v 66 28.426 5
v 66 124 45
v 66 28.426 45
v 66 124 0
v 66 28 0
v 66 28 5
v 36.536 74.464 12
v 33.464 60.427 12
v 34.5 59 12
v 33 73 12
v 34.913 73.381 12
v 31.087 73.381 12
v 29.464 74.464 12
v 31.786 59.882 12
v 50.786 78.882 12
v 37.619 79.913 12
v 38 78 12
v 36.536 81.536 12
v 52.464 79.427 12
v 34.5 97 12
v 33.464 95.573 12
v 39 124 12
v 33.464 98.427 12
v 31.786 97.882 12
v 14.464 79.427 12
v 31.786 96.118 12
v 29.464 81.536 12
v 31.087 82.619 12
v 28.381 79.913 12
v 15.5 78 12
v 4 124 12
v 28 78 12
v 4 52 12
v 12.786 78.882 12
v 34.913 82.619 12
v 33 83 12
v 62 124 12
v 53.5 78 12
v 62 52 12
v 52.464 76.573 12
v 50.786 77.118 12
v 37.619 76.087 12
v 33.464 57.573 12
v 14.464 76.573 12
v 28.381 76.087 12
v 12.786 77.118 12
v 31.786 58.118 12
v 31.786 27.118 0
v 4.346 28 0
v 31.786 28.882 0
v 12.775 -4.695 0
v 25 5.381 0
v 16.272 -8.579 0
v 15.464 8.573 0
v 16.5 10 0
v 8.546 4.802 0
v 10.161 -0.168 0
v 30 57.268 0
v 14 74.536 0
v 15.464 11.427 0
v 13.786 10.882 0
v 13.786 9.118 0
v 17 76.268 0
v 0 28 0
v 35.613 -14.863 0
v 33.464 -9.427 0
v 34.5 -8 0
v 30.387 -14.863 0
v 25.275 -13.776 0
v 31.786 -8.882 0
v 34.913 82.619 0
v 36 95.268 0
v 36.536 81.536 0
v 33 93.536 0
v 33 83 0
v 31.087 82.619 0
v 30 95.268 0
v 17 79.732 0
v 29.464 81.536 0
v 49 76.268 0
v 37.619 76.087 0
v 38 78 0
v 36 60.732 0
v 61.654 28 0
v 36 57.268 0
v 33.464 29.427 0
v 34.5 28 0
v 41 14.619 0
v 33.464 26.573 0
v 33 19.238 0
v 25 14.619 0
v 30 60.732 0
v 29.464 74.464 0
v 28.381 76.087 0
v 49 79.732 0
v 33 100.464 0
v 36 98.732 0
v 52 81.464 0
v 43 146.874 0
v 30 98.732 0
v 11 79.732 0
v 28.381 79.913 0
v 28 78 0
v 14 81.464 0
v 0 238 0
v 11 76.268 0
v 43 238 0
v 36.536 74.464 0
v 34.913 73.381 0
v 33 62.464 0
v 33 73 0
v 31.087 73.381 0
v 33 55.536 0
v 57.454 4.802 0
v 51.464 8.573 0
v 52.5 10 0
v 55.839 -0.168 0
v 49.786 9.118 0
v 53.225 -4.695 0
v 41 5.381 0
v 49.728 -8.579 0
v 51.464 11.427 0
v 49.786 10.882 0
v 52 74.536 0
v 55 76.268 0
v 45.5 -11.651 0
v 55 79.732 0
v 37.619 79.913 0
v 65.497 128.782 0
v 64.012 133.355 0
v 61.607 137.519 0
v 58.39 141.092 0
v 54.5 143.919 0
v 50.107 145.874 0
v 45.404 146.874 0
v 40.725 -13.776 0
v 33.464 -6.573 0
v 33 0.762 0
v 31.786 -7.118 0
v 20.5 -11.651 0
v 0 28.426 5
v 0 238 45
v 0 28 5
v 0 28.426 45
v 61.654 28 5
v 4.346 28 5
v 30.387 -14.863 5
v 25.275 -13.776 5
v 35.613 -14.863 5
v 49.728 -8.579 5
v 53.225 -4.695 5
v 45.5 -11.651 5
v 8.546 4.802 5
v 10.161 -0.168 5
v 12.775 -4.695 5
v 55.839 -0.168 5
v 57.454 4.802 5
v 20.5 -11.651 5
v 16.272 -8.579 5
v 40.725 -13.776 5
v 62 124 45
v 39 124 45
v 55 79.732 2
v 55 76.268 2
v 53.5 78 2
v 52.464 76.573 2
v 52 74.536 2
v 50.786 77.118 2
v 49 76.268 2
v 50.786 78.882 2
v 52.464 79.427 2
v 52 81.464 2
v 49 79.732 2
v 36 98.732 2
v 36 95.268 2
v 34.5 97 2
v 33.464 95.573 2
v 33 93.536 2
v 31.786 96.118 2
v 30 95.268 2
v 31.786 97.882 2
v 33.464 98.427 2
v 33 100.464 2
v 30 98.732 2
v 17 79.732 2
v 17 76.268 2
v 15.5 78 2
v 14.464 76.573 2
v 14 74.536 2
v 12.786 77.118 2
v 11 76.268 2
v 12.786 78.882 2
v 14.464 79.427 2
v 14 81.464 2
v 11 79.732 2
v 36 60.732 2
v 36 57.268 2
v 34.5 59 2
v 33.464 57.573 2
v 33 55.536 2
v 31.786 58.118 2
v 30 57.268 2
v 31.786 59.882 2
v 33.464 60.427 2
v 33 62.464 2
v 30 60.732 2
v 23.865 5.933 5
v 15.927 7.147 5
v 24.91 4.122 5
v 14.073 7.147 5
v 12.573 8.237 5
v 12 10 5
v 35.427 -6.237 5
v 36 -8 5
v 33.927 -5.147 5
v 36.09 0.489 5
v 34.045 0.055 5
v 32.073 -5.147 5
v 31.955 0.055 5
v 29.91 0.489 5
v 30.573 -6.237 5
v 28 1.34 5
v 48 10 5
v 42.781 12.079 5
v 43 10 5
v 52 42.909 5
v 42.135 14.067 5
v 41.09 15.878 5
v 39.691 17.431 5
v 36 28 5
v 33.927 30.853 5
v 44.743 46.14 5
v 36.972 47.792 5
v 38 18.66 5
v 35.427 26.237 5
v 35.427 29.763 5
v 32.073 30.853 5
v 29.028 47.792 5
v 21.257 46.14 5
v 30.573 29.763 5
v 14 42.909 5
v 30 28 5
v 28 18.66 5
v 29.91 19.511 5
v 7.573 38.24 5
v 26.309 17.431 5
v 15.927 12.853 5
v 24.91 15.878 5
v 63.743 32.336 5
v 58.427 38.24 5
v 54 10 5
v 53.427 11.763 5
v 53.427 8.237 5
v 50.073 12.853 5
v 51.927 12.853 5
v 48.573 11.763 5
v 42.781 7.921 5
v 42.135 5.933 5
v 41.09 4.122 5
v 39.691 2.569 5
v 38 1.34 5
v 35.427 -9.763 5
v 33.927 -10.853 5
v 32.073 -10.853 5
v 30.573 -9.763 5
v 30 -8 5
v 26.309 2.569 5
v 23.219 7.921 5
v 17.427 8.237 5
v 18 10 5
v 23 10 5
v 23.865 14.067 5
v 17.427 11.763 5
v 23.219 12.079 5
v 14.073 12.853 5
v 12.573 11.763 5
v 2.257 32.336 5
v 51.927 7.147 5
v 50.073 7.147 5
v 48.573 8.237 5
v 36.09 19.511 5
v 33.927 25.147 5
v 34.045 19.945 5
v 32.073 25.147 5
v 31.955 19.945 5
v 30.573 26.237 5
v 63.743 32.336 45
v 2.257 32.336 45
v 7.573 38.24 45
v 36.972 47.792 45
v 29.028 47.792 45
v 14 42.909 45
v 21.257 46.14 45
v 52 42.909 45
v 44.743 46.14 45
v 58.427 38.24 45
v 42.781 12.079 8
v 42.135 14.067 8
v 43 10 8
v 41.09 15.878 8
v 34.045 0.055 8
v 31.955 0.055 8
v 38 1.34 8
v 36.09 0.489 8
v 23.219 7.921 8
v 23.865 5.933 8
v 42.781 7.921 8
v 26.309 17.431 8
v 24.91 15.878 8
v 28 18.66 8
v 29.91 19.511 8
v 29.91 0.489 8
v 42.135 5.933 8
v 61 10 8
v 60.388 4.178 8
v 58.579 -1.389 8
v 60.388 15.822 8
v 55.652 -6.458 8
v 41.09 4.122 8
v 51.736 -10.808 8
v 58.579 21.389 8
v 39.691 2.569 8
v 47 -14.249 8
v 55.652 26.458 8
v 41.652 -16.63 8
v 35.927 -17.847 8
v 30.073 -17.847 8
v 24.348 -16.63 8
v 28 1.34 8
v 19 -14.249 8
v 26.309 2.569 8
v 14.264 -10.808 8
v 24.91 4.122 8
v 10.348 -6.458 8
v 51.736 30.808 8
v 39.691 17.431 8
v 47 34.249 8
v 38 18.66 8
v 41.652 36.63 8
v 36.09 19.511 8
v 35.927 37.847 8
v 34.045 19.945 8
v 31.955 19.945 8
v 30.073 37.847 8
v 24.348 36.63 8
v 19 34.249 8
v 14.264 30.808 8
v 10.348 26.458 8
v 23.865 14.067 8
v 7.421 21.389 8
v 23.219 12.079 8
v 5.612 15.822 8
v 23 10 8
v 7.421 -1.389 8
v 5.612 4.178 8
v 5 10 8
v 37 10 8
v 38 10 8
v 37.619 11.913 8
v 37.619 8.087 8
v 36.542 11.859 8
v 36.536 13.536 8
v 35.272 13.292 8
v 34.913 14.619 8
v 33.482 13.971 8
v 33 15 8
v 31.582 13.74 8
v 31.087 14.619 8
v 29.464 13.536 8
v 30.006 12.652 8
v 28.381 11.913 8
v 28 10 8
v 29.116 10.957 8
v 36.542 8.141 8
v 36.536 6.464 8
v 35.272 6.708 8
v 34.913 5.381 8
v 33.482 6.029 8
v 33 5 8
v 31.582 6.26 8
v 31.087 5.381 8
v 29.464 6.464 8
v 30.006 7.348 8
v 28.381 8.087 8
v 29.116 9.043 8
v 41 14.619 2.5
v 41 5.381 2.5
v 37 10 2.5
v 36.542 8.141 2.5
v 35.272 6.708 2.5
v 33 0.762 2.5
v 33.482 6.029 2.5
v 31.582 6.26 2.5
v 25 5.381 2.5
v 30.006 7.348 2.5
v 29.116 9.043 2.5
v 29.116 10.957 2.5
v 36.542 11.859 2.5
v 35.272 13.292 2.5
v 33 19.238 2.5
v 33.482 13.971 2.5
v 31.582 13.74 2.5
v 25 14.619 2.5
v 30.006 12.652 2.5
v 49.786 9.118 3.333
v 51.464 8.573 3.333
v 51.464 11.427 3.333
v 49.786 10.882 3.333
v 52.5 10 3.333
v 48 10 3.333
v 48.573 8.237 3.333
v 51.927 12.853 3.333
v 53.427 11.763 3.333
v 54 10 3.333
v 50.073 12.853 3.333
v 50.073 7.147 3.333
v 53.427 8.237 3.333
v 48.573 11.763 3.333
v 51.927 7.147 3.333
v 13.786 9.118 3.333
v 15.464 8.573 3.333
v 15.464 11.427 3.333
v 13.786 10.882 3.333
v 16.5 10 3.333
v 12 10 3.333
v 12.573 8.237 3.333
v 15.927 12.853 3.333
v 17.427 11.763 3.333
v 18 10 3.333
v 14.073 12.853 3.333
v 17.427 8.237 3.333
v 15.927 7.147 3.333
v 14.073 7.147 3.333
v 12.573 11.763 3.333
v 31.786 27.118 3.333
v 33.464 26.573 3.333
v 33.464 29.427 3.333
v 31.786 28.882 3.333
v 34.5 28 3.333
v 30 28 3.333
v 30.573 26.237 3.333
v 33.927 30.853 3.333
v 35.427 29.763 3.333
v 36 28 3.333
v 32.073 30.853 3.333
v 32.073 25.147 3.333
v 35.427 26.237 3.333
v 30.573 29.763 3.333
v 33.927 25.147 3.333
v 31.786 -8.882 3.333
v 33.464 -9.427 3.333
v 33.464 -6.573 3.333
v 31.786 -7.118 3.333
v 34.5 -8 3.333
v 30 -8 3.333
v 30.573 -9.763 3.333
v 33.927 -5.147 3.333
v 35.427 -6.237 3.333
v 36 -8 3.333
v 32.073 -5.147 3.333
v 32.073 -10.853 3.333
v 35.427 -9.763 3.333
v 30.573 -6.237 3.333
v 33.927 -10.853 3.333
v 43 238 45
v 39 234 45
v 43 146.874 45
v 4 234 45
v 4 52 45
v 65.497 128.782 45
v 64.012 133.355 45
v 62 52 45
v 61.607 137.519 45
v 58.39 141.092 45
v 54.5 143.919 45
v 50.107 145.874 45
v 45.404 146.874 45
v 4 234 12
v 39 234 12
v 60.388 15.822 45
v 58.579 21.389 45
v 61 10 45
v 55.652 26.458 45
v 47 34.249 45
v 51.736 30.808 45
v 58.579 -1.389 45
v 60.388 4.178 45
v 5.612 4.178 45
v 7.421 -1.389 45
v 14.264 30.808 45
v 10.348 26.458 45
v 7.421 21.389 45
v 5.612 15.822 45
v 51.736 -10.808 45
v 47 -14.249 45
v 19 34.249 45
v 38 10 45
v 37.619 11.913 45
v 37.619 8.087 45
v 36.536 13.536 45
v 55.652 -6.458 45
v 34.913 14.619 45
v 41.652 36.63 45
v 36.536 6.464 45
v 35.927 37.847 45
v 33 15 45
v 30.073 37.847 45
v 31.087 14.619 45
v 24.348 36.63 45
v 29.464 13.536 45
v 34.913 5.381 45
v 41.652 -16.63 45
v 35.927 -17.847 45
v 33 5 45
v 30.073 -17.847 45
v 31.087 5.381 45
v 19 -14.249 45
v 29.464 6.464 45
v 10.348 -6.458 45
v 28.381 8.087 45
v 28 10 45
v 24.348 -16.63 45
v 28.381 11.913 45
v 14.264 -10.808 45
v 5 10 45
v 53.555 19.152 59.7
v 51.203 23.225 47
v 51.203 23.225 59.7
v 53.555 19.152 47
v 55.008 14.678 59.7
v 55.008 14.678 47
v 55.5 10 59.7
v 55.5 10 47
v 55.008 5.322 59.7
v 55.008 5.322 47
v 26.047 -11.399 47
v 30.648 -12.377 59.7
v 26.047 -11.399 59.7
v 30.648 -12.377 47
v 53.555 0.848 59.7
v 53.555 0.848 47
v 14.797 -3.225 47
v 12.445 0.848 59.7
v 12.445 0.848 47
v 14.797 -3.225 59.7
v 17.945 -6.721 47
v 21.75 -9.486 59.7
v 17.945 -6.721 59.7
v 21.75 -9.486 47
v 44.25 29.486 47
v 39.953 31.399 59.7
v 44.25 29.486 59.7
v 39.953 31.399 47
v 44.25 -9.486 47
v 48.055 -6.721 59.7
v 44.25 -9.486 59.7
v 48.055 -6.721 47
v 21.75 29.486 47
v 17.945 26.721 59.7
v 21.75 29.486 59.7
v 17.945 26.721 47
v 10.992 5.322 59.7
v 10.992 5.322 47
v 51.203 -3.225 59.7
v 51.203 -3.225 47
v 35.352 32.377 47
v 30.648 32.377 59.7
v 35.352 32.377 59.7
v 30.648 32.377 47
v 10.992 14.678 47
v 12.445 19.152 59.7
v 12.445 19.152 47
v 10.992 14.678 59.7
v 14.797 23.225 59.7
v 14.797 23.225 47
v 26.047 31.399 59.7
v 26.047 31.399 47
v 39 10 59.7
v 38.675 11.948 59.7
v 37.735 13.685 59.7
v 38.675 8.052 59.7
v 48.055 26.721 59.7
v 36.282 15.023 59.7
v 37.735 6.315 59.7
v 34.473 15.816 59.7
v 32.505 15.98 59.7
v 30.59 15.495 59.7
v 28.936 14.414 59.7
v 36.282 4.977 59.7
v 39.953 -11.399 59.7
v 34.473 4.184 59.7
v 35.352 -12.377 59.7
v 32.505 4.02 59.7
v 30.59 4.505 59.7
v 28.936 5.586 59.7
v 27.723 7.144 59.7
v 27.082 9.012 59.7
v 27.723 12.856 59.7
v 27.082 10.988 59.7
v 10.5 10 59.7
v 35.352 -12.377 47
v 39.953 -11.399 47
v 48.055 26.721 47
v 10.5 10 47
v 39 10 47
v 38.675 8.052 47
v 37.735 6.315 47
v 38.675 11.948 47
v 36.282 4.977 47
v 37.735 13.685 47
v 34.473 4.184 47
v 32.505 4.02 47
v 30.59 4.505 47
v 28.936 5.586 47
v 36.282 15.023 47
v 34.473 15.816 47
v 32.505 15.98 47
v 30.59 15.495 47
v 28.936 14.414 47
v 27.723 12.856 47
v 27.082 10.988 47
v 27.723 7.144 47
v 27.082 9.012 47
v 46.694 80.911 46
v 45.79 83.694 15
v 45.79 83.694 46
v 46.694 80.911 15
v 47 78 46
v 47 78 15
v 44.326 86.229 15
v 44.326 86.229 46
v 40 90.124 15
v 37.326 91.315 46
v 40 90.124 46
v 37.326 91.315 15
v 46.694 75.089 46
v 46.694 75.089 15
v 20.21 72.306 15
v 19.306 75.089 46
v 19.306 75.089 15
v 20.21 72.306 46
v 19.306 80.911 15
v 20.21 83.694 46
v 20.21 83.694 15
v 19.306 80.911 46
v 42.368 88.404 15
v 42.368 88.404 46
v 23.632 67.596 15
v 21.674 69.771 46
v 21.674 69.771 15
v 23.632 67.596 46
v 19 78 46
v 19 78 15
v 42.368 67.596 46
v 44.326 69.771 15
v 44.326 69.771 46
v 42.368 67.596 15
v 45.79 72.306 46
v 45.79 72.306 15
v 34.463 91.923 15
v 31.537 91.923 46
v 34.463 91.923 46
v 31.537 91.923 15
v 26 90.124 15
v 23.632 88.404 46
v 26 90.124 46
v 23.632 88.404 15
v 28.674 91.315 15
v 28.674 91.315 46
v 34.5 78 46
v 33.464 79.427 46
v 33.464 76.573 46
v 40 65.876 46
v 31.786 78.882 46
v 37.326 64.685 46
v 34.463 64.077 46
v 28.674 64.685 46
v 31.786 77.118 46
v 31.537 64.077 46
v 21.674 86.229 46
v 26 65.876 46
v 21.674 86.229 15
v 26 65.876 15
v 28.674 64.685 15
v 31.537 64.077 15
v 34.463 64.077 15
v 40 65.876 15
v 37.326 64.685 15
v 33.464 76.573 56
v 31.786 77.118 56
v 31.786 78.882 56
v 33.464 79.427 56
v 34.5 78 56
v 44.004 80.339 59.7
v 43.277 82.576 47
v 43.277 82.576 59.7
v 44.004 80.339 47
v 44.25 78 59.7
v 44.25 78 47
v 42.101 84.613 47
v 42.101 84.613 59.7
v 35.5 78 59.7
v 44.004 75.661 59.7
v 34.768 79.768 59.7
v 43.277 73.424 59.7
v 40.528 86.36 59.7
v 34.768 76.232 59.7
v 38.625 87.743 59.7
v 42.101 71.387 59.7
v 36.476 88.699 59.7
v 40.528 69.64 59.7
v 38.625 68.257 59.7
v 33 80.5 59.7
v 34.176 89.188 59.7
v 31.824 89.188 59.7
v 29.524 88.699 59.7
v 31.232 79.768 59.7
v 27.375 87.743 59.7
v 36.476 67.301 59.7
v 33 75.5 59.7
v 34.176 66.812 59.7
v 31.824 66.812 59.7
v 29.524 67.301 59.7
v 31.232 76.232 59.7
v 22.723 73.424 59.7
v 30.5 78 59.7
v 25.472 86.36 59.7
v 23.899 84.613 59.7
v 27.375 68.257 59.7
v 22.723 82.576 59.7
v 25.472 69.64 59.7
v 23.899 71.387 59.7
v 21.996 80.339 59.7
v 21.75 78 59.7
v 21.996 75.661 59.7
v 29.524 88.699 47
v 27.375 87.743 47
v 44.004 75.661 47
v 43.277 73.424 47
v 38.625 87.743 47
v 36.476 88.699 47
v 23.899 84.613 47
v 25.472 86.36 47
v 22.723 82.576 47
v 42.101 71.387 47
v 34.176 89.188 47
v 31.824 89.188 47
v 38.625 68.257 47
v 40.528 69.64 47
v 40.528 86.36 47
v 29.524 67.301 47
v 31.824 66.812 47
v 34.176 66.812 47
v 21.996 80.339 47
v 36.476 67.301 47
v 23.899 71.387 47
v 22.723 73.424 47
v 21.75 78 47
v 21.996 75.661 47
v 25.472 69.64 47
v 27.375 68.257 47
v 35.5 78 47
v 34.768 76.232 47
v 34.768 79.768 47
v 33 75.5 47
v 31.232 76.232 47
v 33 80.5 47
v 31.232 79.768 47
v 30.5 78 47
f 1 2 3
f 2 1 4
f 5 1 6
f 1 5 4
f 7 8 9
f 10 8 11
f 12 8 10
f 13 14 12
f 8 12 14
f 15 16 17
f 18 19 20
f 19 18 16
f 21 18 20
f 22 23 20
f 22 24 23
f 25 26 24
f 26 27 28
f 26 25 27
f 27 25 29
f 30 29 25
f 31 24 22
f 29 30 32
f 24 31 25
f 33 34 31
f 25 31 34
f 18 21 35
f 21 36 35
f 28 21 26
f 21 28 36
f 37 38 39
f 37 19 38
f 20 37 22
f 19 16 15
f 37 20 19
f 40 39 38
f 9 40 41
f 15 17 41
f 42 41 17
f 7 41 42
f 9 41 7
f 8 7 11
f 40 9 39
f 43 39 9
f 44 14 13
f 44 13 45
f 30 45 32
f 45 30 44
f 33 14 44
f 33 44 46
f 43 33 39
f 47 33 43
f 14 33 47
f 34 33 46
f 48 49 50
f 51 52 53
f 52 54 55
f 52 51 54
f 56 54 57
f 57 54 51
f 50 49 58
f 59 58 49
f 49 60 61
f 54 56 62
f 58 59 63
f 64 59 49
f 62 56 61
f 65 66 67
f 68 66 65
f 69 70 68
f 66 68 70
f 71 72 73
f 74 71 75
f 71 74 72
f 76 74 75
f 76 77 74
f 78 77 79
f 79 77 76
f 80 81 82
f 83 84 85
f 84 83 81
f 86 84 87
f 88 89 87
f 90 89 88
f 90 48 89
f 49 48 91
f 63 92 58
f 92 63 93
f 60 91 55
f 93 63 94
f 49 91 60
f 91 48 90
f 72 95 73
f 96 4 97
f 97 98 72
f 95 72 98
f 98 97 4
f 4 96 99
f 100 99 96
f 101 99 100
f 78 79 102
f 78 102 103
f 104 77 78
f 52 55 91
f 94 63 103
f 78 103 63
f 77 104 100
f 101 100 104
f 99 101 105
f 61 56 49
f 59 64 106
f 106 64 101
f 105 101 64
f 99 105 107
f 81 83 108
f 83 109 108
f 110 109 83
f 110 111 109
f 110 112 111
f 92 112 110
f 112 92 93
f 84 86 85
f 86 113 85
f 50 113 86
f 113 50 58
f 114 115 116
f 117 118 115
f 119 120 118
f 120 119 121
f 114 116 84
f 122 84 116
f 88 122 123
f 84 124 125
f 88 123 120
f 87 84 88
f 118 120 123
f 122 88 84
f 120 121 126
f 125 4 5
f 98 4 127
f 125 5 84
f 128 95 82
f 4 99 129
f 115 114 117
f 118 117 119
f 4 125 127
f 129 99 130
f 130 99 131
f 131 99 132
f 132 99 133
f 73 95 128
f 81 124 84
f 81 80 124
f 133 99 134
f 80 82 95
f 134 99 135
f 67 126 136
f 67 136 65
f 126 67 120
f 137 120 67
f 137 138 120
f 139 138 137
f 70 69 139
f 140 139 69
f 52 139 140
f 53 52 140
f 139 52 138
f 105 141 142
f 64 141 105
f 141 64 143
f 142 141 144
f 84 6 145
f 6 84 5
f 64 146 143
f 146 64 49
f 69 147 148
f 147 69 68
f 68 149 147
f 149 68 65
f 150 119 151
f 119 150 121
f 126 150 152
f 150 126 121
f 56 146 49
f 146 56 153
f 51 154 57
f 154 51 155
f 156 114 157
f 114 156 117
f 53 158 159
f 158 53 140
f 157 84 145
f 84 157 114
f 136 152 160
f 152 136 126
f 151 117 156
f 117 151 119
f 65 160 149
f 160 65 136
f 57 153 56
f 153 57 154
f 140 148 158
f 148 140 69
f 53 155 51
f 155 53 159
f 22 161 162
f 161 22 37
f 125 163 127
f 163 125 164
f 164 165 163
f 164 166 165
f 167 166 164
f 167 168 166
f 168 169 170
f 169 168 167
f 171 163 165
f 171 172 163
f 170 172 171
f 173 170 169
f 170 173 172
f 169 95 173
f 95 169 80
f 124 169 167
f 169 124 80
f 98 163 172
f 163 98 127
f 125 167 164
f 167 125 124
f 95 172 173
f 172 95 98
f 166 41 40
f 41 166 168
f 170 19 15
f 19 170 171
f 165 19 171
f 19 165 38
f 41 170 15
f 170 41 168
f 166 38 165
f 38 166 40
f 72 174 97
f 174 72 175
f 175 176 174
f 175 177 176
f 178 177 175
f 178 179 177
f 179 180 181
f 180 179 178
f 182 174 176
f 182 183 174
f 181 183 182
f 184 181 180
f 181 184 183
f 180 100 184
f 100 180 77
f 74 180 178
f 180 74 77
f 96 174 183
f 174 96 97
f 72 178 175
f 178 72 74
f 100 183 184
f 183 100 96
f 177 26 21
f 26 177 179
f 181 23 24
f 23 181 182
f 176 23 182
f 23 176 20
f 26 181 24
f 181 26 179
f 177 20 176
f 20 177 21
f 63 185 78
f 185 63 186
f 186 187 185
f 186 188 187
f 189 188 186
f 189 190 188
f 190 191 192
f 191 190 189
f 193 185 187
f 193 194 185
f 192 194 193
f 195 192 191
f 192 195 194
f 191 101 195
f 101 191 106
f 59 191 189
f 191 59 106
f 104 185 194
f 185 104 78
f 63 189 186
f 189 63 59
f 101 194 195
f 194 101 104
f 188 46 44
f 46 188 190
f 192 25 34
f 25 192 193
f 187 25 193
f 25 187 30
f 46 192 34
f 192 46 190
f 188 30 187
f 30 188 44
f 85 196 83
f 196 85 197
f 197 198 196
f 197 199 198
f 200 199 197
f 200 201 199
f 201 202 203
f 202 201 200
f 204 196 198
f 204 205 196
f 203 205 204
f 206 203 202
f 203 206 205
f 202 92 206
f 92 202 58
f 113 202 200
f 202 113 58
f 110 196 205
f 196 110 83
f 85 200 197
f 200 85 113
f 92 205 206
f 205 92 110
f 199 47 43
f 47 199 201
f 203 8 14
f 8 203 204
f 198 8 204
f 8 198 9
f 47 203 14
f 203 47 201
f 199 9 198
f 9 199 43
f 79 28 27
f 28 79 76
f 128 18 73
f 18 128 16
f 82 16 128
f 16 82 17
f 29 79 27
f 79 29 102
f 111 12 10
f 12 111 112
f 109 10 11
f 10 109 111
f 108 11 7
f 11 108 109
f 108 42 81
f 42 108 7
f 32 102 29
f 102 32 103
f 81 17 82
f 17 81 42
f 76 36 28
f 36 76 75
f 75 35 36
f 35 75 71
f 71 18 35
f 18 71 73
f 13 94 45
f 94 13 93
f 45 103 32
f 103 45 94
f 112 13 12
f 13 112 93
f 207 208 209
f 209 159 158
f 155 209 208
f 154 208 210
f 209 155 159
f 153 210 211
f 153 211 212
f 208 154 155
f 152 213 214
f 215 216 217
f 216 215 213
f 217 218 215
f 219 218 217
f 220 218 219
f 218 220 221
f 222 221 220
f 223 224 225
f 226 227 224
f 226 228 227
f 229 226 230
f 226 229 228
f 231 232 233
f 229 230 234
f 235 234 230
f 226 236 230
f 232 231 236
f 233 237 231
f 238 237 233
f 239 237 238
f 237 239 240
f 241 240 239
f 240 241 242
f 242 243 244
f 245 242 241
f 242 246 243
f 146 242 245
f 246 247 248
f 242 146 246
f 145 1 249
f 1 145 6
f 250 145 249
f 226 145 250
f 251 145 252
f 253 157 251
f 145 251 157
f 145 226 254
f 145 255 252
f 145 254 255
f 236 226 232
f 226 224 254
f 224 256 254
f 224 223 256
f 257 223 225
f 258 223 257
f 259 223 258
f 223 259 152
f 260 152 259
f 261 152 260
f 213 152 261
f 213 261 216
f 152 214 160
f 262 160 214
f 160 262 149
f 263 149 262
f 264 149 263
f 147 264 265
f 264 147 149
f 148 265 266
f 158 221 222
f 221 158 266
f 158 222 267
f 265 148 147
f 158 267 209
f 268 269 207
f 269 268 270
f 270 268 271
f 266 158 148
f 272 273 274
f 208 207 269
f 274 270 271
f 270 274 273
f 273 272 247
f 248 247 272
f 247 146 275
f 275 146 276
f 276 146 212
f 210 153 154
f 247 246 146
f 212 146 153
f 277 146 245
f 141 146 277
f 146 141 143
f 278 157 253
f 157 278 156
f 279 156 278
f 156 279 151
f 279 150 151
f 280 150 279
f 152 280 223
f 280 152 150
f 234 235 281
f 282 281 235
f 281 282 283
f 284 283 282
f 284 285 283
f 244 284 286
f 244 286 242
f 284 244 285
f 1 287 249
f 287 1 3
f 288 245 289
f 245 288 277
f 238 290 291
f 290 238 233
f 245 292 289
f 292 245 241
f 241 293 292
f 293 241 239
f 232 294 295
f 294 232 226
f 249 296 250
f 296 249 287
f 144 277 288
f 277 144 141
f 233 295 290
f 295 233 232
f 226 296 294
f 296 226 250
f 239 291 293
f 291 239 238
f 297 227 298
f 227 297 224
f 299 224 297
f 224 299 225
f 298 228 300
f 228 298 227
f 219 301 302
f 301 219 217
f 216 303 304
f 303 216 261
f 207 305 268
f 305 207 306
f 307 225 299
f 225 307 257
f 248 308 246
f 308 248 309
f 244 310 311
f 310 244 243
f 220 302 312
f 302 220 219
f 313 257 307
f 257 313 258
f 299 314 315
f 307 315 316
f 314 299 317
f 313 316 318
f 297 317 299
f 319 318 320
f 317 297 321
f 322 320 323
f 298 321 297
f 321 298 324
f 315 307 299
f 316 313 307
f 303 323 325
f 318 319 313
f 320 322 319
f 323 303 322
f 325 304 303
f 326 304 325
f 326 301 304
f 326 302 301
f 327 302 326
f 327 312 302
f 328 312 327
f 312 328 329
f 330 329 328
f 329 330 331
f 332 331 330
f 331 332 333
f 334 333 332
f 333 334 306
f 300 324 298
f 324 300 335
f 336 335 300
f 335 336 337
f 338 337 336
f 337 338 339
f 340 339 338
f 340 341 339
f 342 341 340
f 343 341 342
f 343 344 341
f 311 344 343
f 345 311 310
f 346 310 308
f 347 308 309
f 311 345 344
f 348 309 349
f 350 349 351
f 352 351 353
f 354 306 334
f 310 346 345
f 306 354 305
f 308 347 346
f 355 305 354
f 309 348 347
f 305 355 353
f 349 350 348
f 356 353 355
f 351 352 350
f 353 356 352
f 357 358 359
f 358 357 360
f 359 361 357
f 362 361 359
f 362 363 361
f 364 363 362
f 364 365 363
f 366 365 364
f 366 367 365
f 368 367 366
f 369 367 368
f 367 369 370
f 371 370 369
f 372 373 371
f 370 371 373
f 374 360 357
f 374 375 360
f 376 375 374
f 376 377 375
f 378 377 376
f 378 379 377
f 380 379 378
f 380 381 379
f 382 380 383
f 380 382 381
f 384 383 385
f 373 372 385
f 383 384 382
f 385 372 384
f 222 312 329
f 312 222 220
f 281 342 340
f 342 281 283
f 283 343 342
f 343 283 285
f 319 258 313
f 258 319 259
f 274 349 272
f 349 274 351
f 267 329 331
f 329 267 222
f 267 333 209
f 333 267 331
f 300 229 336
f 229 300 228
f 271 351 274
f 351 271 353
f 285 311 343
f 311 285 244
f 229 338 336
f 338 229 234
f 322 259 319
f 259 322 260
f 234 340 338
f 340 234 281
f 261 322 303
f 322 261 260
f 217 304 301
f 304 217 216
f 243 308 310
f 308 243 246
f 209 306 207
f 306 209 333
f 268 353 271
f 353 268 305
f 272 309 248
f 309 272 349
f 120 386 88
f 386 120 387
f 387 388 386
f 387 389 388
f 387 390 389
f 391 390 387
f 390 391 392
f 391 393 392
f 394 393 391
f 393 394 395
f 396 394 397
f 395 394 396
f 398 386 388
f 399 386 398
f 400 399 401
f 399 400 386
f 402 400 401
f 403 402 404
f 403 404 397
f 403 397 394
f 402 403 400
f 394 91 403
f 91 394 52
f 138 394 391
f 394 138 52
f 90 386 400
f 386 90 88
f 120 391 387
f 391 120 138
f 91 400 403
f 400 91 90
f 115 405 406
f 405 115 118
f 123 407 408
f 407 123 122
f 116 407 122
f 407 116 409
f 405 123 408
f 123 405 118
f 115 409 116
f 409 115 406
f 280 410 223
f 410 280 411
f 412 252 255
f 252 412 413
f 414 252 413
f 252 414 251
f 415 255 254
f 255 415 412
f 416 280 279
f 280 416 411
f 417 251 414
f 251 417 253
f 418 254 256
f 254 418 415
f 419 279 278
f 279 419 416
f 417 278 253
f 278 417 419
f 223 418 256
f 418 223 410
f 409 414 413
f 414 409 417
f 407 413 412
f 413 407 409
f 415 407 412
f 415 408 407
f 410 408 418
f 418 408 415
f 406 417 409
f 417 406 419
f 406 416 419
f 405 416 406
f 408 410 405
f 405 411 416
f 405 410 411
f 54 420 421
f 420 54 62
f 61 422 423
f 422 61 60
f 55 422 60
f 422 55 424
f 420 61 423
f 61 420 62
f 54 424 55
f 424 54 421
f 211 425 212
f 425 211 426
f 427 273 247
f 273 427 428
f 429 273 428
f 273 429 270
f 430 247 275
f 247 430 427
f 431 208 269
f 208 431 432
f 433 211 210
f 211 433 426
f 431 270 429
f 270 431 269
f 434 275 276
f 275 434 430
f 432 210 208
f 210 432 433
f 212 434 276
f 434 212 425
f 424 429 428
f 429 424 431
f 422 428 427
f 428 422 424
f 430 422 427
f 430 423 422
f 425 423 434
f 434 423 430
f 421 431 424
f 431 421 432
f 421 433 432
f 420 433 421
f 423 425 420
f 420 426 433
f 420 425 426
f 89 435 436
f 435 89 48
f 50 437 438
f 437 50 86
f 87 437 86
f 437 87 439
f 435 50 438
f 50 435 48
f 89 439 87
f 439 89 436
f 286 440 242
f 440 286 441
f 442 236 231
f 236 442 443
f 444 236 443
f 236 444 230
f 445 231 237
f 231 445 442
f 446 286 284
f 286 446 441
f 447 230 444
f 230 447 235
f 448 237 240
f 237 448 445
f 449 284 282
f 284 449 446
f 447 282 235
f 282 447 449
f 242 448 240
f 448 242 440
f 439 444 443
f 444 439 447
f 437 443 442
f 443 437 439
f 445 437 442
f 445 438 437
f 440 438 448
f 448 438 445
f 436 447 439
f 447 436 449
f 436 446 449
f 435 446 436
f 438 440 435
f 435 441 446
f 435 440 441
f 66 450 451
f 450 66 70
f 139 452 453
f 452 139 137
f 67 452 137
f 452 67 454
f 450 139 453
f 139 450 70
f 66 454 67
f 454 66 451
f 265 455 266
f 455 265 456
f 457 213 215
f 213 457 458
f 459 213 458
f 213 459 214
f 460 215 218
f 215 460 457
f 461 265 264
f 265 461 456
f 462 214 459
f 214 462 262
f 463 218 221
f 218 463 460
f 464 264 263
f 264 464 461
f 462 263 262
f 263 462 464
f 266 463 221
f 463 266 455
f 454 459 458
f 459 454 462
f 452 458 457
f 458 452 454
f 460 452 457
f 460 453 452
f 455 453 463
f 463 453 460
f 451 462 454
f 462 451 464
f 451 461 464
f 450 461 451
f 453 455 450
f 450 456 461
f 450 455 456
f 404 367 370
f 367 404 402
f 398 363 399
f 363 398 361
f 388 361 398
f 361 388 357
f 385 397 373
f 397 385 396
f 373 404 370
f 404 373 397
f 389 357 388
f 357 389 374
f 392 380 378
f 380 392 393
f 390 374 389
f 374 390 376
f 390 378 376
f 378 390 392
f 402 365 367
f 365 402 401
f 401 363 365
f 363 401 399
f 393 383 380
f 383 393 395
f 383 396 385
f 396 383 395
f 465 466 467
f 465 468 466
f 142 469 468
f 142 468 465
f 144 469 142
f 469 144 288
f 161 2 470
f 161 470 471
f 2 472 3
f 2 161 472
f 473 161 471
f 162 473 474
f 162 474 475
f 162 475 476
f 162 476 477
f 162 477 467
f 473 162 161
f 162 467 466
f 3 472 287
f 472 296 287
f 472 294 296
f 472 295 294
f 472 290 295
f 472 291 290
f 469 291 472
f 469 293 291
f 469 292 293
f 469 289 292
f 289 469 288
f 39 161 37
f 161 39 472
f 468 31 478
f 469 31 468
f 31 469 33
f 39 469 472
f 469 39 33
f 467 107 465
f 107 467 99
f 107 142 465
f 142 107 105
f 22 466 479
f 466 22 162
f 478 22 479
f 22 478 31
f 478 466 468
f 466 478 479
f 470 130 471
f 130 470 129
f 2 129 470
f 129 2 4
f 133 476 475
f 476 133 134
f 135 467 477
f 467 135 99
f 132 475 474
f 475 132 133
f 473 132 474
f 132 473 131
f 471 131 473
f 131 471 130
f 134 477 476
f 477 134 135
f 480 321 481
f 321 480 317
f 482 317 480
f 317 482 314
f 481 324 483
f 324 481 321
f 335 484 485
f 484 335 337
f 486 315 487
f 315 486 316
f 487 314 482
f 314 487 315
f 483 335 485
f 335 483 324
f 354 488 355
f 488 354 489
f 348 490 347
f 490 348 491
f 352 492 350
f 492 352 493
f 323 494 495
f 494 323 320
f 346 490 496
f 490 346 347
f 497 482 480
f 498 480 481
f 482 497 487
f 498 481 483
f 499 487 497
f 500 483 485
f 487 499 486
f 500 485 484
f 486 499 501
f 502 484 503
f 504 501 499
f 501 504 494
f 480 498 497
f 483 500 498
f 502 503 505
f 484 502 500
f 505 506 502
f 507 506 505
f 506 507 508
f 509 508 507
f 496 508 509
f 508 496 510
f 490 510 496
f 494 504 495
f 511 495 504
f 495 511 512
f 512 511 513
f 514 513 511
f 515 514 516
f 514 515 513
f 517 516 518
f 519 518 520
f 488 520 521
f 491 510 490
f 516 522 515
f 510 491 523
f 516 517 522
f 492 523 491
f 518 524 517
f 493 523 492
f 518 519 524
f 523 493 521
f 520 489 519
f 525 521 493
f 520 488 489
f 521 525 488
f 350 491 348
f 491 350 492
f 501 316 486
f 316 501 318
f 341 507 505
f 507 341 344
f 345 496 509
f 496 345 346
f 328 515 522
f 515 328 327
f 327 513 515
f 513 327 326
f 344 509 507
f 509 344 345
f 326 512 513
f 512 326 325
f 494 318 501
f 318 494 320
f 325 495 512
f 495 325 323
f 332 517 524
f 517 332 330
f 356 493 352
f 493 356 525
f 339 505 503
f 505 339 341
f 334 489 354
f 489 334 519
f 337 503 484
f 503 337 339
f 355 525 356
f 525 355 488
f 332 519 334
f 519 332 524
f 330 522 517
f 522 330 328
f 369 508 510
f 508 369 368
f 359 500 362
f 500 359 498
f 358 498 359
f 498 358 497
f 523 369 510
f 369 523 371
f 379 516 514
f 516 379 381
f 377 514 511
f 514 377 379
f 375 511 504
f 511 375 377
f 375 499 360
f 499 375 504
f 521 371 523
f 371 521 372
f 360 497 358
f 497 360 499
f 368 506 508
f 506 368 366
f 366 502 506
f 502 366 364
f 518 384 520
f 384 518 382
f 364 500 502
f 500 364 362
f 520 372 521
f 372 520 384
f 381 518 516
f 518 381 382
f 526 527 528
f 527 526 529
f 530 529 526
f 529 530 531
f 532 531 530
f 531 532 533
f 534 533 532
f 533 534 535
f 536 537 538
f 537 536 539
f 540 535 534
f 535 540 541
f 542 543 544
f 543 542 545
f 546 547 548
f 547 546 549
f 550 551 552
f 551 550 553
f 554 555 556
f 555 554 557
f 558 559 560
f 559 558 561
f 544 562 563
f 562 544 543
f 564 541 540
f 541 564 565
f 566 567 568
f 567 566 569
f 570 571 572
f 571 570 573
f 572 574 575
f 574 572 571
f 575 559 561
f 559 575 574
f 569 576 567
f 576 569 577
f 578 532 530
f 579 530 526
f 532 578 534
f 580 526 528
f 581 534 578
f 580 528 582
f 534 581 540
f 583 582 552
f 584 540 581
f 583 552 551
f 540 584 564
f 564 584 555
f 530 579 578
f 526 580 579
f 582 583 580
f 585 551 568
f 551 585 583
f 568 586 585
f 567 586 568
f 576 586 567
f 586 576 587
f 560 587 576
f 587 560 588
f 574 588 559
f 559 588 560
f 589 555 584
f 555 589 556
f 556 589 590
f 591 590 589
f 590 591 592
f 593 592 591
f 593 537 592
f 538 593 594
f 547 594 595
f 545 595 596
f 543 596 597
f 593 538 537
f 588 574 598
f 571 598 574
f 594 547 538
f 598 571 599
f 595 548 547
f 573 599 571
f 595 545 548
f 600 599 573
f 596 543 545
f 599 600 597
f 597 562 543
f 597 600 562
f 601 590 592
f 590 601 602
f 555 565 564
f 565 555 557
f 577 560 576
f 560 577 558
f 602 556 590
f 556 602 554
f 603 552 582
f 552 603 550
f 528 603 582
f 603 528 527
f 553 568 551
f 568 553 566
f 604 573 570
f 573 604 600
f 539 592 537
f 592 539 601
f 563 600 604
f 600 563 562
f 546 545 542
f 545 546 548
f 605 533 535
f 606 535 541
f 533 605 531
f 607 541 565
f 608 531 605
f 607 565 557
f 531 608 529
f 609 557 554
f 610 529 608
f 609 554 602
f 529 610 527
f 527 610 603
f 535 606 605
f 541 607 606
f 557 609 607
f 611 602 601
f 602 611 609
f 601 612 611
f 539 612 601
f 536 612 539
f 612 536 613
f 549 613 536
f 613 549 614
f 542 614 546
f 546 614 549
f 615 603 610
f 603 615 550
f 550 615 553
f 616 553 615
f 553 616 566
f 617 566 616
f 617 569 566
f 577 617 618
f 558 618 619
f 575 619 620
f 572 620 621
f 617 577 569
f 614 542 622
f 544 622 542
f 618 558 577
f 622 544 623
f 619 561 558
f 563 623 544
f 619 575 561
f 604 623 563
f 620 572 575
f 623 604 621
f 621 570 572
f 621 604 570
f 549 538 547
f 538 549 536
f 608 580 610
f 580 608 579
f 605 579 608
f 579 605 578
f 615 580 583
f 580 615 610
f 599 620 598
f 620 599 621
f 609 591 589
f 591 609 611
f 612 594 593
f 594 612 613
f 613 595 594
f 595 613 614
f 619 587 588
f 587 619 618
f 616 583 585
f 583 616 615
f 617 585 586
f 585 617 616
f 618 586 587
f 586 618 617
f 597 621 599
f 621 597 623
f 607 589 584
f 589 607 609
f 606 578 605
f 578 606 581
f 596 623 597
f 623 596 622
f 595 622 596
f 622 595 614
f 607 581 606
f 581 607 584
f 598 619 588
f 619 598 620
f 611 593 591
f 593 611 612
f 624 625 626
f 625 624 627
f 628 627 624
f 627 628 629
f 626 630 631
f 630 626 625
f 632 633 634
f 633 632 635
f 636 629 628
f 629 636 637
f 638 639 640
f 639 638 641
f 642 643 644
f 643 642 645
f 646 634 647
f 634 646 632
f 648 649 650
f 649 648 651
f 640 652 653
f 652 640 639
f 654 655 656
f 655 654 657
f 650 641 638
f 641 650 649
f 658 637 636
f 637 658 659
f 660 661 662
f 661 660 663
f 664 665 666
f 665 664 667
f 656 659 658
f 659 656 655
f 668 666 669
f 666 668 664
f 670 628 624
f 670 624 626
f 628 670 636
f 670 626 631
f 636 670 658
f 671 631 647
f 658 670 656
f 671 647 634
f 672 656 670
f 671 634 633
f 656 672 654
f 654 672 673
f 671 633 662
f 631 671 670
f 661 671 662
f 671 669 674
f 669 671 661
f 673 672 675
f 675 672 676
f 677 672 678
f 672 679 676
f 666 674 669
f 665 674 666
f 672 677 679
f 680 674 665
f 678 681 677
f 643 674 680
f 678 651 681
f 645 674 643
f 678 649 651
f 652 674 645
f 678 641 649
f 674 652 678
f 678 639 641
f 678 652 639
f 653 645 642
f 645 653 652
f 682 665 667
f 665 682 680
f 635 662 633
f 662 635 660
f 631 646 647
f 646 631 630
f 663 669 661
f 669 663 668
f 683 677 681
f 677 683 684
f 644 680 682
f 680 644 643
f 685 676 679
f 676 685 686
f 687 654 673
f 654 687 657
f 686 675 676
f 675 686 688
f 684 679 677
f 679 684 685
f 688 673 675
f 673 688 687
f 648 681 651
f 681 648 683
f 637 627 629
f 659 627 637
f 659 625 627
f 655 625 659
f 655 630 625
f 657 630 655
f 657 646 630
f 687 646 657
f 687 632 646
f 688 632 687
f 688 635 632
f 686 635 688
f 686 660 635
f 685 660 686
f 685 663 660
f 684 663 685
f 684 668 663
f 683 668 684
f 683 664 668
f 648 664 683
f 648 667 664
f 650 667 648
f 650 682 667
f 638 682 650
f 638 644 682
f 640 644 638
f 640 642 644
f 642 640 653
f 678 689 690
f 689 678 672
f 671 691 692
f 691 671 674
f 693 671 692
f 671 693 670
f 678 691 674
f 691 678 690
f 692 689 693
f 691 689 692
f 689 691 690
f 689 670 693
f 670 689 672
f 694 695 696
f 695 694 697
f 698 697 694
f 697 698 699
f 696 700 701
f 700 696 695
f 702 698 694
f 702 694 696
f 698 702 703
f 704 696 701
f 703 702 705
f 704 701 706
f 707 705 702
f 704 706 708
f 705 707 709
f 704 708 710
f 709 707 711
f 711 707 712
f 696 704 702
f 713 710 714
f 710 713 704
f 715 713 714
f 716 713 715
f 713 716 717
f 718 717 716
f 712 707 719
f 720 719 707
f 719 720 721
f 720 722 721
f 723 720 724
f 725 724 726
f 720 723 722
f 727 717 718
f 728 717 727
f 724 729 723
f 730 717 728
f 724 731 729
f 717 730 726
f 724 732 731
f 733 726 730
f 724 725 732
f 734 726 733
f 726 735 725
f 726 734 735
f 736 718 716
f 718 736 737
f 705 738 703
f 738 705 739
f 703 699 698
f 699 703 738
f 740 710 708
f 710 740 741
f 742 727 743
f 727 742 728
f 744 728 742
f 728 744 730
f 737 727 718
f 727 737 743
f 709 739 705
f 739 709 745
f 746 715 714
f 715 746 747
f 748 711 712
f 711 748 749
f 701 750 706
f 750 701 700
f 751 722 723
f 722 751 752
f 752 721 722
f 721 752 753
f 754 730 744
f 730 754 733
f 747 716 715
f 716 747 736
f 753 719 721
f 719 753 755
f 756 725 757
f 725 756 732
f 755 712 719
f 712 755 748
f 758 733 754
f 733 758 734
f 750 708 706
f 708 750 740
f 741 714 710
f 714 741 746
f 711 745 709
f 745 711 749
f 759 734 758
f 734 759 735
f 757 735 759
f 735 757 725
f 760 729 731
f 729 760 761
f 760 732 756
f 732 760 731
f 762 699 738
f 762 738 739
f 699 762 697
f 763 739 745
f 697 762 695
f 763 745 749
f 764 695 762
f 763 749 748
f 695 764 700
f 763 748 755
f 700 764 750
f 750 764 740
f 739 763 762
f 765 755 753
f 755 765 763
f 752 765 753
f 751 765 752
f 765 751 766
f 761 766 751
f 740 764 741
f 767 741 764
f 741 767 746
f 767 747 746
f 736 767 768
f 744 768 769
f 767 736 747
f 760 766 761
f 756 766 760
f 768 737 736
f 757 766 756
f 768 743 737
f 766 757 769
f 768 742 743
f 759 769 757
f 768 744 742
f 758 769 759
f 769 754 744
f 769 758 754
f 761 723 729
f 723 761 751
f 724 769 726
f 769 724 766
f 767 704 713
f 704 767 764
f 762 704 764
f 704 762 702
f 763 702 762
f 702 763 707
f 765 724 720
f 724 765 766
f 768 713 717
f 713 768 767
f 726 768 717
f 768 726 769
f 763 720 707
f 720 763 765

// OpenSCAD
// file: gears.scad
module wheel_gear() {
	translate(wheel_center) translate([0,0, 
		wheel_height + gear_offset]) {
		difference() {
			cylinder(h=gear_thick, r=wheel_gear_dia/2);
			cylinder(h=gear_thick, r=wheel_shaft_dia/2 + 2);
		}
	}
}

module motor_gear() {
	translate(motor_center) translate([0,0, 
		wheel_height + gear_offset + wheel_offset + wheel_guard]) {
		difference() {
			cylinder(h=gear_thick, r=motor_gear_dia/2);
			cylinder(h=gear_thick, r=motor_shaft_dia/2 + 1);
		}
	}
}
// file: hexagon.scad
module hexagon(d,h)
{
	angle = 360/6;
	cote = d * cot(angle);

	union()
	{
		rotate([0,0,0])
			cube([d,cote,h],center=true);
		rotate([0,0,angle])
			cube([d,cote,h],center=true);
		rotate([0,0,2*angle])
			cube([d,cote,h],center=true);
	}
}

function cot(x)=1/tan(x);
// file: extras.scad
include <gears.scad>

module wheel() {
	translate (wheel_center) {
		difference() {
			cylinder(h = wheel_height, r = wheel_dia/2);
			cylinder(h = wheel_height, r = wheel_shaft_dia/2 + 1); 
		}
	}
}

module motor() {
	translate (motor_center) {
		cylinder( h = motor_len-motor_shaft_len, r = motor_dia/2);
		cylinder( h = motor_len, r=motor_shaft_dia/2);
	}
}
// file: box.scad
include <constants.scad>
include <hexagon.scad>

show_motor_box = 1;

module battery_box() {
	translate([0, base_height, 0])
	difference() {
		cube([
			battery_w + wall_thick*2,
			battery_l + wall_thick,
			base_thick + wheel_height + wheel_offset + wheel_guard
		]);

		translate([wall_thick, 0, base_thick])
			cube([
				battery_w,
				battery_l,
				wheel_height + wheel_offset + wheel_guard				
			]);
	}

	translate ([battery_w + wall_thick*2, base_height, 0]) {
		intersection() {
			cylinder(
				h = 	base_thick + wheel_height + wheel_offset + wheel_guard,
				r = (base_width - battery_w - wall_thick*2)
			);
			cube([
				base_width - battery_w - wall_thick*2,
				base_width - battery_w - wall_thick*2,
				base_thick + wheel_height + wheel_offset + wheel_guard
			]);
		}
	}
}

module base() {
	difference() {

		translate([0, -1 * wheel_dia/2, 0])
		cube([
			base_width,
			base_height + wheel_dia/2,
			base_thick]);

		difference() {
			translate([0, -1 * wheel_dia/2, 0])
			cube([
				base_width,
				wheel_dia/2 + shaft_offset + 18,
				base_thick
			]);
			hull() {
			translate([base_width/2, shaft_offset, 0])
				cylinder(h=base_thick, d=wheel_dia - wheel_guard * 2);
			translate([0, wheel_dia/2 + shaft_offset + 10 + wall_thick, 0])
				cube([
					base_width,
					2,
					base_thick
				]);
			}
		}
	}
}

module motor_mount_holes() {
	translate (motor_center) translate([0,0,-1 * base_thick]) {
		//Center hole
		cylinder(h=base_thick, d=motor_mount_centerhole_dia);

		translate([motor_mount_holes_dist/2,0,0]) {
			cylinder(h=base_thick, d=motor_mount_holes_dia);
			hexagon(h=base_thick/3, d=motor_mount_holes_dia * 2);

		}
		translate([0,motor_mount_holes_dist/2,0]) {
			cylinder(h=base_thick, d=motor_mount_holes_dia);
			hexagon(h=base_thick/3, d=motor_mount_holes_dia * 2);
		}
		translate([-1 * motor_mount_holes_dist/2,0,0]) {
			cylinder(h=base_thick, d=motor_mount_holes_dia);
			hexagon(h=base_thick/3, d=motor_mount_holes_dia * 2);
		}
		translate([0,-1 * motor_mount_holes_dist/2,0]) {
			cylinder(h=base_thick, d=motor_mount_holes_dia);
			hexagon(h=base_thick/3, d=motor_mount_holes_dia * 2);
		}
	}

}

module base_mounting_holes() {
	
	mount_hole_radius = base_width/2 - 15;
	mount_hole_base_thick = base_thick + wheel_offset;
	
	translate([base_width/2, shaft_offset, 0]) {
		translate([mount_hole_radius, 0, 0]) {
			cylinder(h=base_thick, d=3);
			translate([0,0,2*mount_hole_base_thick/3])
			cylinder(h=base_thick/3, d=motor_mount_holes_dia * 2);
		}
		translate([-1 * mount_hole_radius, 0, 0]){
			cylinder(h=base_thick, d=3);
			translate([0,0,2*mount_hole_base_thick/3])
			cylinder(h=base_thick/3, d=motor_mount_holes_dia * 2);
		}
		translate([0, mount_hole_radius, 0]){
			cylinder(h=base_thick, d=3);
			translate([0,0,2*mount_hole_base_thick/3])
			cylinder(h=base_thick/3, d=motor_mount_holes_dia * 2);
		}
		translate([0, -1 * mount_hole_radius, 0]){
			cylinder(h=base_thick, d=3);
			translate([0,0,2*mount_hole_base_thick/3])
			cylinder(h=base_thick/3, d=motor_mount_holes_dia * 2);
		}
	}
}

module motor_box() {
	translate ([0, 0, base_thick]) {
		difference () {
			cube([
				base_width,
				base_height,
				wheel_height + wheel_guard + wheel_offset]);

			translate([base_width/2, shaft_offset, 0]) {
				cylinder( h = wheel_height + wheel_guard, d = wheel_dia + 20);
			}

			translate([wall_thick, wheel_dia/2 + shaft_offset + 10 + wall_thick, 0])
			cube([
				base_width - wall_thick * 2,
				base_height,
				wheel_height + wheel_guard
			]);
		}
	}
}

module wheel_shaft() {
	translate (shaft_center) 
		cylinder(h = wheel_shaft_len, r = wheel_shaft_dia/2);
}

module wheel_shaft_hole() {
	translate([base_width/2, shaft_offset, 0])
		cylinder(h=base_thick, r=wheel_shaft_dia/2);
}

module box() {
	echo("Length of the device: ", base_height + base_thick*2 + battery_l );
	echo("Height of the motor box:", wheel_height + wheel_guard + wheel_offset + base_thick);

	difference () {
		union() {
		difference () {
			base();

			// Motor mounting holes
			motor_mount_holes();


			// Space around wheel
			translate([base_width/2, shaft_offset, base_thick + wheel_offset]) {
				cylinder( h = wheel_height + wheel_guard, d = wheel_dia + 20);
			}
		}

		// Wheel offset
		translate([
			base_width/2,
			shaft_offset,
			0])
			cylinder(h=base_thick + wheel_offset + wheel_guard, r=shaft_offset);
		}


		// Wheel center hole
		wheel_shaft_hole();

		// Wheel lock nut
		translate([base_width/2, shaft_offset, 0]) hexagon(d=wheel_shaft_dia*2, h=5);

		//Base mounting holes
		base_mounting_holes();
	}

	if (show_motor_box) {
		motor_box();
	}

	if (show_shaft) {
		//Wheel position
		wheel_shaft();
	}

	if (show_battery_box) {
		battery_box();
	}
}

box();
// file: constants.scad
show_motor_box = 1;
show_motor_base = 1;
show_battery_box = 1;

show_shaft = 0;
show_extras = 0;

battery_l = 110;
battery_w = 35;
battery_h = 30;

motor_dia = 28;
motor_len = 41;
motor_shaft_len = 10;
motor_shaft_dia = 3;
motor_offset = 40;

motor_mount_centerhole_dia = 10;
motor_mount_holes_dist = 38; //(r = 19)
motor_mount_holes_dia = 3;
motor_mount_thick = 3;

wheel_dia = 56;
wheel_height = 37;
wheel_guard = 3;
wheel_offset = -7;
wheel_shaft_dia = 8;

gear_offset = 2;
gear_thick = 12.7;
wheel_gear_dia = 45;
motor_gear_dia = wheel_gear_dia/2;

wheel_shaft_len = wheel_height + wheel_guard + gear_thick + 10;

base_width = wheel_dia + 10;
base_height = wheel_dia + motor_dia + 40;
base_thick = 12;
wall_thick = 4;

shaft_offset = 10;

wheel_center = [base_width/2, shaft_offset, base_thick + wheel_offset + wheel_guard];
shaft_center = [base_width/2, shaft_offset, base_thick + wheel_offset];
motor_center = [base_width/2, shaft_offset + motor_offset + wheel_dia/2, base_thick];
// main file
include <constants.scad>
include <box.scad>
include <extras.scad>

show_motor_box = 1;
show_motor_base = 1;
show_battery_box = 1;

show_shaft = 0;
show_extras = 1;


module walker() {
	echo("");
	box();

	if(show_extras) {
		wheel();
		wheel_gear();

		translate([0,0, motor_mount_thick]) motor();
		motor_gear();
	}
}

walker();
echo("");
